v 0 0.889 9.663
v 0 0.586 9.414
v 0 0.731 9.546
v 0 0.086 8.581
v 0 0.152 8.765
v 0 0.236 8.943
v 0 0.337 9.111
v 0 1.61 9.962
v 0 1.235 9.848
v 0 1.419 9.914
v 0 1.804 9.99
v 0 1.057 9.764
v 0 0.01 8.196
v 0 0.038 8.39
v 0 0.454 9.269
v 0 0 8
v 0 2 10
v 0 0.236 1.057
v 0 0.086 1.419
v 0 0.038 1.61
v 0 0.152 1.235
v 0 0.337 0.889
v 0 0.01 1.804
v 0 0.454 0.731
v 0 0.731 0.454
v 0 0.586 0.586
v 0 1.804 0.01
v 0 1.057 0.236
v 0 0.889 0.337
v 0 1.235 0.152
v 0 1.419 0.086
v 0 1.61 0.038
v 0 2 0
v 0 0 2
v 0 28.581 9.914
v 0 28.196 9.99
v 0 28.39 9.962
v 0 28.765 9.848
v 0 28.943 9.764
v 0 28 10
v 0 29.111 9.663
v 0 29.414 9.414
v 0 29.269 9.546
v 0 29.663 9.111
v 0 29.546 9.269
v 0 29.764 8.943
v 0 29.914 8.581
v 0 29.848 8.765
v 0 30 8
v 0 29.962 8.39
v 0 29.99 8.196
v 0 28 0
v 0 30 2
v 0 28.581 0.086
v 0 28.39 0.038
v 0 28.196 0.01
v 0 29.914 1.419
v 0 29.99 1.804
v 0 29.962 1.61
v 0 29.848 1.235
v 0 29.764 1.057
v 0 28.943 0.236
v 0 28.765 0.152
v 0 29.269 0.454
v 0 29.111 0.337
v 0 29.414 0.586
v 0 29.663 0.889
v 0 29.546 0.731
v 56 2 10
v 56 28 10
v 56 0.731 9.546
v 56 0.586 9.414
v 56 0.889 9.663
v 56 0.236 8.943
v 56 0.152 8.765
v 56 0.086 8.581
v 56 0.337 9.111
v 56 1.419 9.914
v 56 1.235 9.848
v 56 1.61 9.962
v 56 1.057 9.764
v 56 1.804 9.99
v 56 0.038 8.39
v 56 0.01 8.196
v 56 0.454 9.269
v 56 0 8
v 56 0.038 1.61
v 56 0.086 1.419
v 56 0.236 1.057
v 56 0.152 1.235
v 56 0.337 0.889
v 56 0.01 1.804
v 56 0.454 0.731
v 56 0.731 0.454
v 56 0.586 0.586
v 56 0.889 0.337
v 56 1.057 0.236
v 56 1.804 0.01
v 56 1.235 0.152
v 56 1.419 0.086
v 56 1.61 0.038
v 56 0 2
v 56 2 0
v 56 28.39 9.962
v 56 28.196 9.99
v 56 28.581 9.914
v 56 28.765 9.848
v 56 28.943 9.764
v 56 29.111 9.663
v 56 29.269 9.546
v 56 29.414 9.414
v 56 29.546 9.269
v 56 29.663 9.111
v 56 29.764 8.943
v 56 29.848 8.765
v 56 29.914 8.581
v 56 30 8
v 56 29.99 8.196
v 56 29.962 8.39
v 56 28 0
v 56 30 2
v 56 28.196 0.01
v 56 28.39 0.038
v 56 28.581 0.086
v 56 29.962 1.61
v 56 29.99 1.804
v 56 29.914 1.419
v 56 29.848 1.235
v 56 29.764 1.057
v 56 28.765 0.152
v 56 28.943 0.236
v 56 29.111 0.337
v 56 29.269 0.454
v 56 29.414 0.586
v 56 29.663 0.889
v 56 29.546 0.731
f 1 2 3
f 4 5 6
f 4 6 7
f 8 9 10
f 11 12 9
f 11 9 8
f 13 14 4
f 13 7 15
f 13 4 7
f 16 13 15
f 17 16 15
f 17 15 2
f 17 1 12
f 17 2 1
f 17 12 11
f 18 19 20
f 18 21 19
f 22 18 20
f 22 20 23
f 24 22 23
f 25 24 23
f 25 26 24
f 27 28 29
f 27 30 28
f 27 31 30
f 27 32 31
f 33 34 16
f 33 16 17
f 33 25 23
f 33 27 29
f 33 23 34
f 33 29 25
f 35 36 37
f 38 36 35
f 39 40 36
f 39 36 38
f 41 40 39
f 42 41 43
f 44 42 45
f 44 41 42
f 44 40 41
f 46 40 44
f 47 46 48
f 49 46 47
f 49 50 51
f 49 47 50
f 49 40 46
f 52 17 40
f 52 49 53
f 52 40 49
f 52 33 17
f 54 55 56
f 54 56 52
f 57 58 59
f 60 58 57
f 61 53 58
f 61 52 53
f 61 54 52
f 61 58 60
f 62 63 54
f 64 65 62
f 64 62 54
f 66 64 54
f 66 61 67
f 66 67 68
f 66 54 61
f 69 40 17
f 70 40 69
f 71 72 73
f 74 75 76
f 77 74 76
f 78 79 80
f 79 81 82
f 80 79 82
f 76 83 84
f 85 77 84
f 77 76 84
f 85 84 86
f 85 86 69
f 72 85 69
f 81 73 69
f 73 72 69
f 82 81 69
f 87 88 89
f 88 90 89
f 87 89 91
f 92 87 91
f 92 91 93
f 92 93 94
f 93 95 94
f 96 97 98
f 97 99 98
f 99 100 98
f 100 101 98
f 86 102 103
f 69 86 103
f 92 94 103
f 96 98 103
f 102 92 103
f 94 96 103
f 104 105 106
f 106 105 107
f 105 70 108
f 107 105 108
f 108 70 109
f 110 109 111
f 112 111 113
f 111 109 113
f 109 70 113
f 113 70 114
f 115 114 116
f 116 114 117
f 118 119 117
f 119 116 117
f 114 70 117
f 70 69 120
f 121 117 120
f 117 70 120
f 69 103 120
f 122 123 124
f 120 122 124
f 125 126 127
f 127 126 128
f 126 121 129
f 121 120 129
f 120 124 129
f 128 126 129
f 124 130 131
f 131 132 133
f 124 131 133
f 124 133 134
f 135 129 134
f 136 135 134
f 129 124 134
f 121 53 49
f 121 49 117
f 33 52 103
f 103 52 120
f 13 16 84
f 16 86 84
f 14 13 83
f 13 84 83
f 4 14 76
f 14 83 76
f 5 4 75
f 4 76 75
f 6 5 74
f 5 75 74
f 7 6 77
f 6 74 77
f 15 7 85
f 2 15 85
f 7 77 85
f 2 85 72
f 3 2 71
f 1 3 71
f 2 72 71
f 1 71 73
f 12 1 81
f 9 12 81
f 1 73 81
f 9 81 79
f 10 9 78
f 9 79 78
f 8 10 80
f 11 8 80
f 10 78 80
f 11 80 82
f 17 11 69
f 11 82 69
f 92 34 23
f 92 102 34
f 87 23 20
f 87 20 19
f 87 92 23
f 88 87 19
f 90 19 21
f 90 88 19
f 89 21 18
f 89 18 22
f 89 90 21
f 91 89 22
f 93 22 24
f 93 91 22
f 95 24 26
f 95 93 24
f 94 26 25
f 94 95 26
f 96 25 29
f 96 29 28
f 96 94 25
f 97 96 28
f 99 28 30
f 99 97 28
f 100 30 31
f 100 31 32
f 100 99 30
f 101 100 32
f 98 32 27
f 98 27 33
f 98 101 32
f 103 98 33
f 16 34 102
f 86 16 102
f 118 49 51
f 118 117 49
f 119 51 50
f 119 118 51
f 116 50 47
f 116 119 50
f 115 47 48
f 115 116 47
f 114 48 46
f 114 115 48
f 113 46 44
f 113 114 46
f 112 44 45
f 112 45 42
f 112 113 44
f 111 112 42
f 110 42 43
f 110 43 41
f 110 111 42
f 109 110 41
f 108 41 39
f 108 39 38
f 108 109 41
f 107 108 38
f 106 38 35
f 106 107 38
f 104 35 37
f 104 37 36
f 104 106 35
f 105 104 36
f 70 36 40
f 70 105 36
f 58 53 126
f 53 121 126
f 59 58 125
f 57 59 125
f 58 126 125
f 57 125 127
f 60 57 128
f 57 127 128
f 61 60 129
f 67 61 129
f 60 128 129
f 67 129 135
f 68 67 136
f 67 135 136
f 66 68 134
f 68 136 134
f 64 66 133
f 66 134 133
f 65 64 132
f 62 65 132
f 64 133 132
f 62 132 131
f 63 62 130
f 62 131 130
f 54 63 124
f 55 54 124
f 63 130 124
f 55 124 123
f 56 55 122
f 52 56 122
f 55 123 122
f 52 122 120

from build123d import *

# Parameters (mm, degrees)
SKIZZE1_W                       = 56
SKIZZE1_H                       = 30
AUFSATZ_LINEAR_AUSTRAGEN1_DEPTH = 10
VERRUNDUNG1_R                   = 2


with BuildPart() as part:
    # Skizze1 → Aufsatz-Linear austragen1 (new body)
    with BuildSketch(Plane.XY):
        with Locations((28, 15)):
            Rectangle(SKIZZE1_W, SKIZZE1_H)
    extrude(amount=AUFSATZ_LINEAR_AUSTRAGEN1_DEPTH)

    # Verrundung1
    verrundung1_edges = [part.edges().sort_by_distance(p)[0] for p in [
        (28, 30, 10),
        (28, 30, 0),
        (28, 0, 0),
        (28, 0, 10),
    ]]
    fillet(verrundung1_edges, radius=VERRUNDUNG1_R)


solid = part.part
